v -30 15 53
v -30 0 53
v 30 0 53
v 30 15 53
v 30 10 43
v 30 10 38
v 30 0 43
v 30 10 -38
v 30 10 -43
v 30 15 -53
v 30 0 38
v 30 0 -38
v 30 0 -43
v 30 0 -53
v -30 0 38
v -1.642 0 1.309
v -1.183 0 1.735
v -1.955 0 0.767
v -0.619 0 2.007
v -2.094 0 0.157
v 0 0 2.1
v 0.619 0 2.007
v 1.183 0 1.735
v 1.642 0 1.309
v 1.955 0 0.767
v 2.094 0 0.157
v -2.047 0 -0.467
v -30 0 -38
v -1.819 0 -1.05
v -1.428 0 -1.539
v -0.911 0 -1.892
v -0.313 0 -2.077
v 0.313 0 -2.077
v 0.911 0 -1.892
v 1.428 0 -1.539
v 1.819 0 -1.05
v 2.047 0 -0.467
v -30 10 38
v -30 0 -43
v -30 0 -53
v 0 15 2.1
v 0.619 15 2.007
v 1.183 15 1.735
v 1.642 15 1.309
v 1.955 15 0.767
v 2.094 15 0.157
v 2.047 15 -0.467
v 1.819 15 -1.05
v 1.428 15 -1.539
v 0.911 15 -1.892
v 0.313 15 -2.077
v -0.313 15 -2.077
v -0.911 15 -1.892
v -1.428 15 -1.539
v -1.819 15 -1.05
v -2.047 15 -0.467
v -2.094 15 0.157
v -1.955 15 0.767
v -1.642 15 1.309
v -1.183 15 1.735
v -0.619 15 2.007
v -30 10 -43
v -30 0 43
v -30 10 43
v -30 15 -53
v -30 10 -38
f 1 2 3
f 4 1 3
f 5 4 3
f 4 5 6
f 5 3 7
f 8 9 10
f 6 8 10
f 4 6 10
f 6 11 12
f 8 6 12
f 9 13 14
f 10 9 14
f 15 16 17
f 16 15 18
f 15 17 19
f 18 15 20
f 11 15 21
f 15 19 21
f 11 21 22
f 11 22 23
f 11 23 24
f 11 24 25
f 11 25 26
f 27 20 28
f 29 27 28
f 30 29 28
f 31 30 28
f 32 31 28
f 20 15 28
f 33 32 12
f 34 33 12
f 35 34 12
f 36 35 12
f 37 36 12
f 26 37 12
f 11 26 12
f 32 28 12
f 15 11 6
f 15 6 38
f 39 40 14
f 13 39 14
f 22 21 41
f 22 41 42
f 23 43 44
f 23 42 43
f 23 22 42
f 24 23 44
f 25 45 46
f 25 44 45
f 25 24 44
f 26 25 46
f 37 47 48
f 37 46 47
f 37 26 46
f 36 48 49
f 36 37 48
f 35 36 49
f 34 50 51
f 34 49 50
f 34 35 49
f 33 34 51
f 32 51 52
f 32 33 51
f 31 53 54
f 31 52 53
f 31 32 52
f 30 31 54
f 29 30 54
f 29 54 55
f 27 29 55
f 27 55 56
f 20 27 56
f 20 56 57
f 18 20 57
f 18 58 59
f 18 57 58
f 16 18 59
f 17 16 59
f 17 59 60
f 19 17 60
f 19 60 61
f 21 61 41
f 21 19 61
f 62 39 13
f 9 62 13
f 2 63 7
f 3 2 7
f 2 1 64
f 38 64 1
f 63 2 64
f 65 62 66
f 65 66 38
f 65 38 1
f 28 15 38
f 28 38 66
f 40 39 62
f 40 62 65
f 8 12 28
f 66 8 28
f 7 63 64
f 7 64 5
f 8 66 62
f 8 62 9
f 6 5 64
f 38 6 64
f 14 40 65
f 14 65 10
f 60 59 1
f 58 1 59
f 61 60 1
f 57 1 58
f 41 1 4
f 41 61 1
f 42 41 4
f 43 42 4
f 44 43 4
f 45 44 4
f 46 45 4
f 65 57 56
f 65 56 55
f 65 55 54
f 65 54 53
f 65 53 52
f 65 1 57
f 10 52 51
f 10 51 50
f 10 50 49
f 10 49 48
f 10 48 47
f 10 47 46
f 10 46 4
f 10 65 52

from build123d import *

# Parameters (mm, degrees)
SKETCH_1_W               = 60
SKETCH_1_H               = 106
EXTRUDE_1_DEPTH          = 15
CUT_EXTRUDE_1_DEPTH      = 10
CUT_EXTRUDE_2_DEPTH      = 63.721607122
CUT_EXTRUDE_2_DEPTH_BACK = 63.721607122
SKETCH_3_R               = 2.1


with BuildPart() as part:
    # 草图1 → 凸台-拉伸1 (new body)
    with BuildSketch(Plane(origin=(0, 0, 0), x_dir=(1, 0, 0), z_dir=(0, 1, 0))):
        Rectangle(SKETCH_1_W, SKETCH_1_H)
    extrude(amount=EXTRUDE_1_DEPTH)

    # 草图2 → 切除-拉伸1 (cut)
    with BuildSketch(Plane.XZ):
        Polygon((-32.957810335, 43), (38.640191428, 43), (38.640191428, 38), (-35.799000882, 38), align=None)
        Polygon((38.640191428, -38), (-35.799000882, -38), (-32.957810335, -43), (38.640191428, -43), align=None)
    extrude(amount=-CUT_EXTRUDE_1_DEPTH, mode=Mode.SUBTRACT)

    # 草图3 → 切除-拉伸2 (cut, two sides: drawn at the far end of the back side and taken through both)
    with BuildSketch(Plane(origin=(0, 15, 0), x_dir=(1, 0, 0), z_dir=(0, 1, 0)).offset(-CUT_EXTRUDE_2_DEPTH_BACK)):
        with Locations(Location((0, 0, 0), (0, 0, 270))):
            Circle(SKETCH_3_R)
    extrude(amount=CUT_EXTRUDE_2_DEPTH + CUT_EXTRUDE_2_DEPTH_BACK, mode=Mode.SUBTRACT)


solid = part.part
